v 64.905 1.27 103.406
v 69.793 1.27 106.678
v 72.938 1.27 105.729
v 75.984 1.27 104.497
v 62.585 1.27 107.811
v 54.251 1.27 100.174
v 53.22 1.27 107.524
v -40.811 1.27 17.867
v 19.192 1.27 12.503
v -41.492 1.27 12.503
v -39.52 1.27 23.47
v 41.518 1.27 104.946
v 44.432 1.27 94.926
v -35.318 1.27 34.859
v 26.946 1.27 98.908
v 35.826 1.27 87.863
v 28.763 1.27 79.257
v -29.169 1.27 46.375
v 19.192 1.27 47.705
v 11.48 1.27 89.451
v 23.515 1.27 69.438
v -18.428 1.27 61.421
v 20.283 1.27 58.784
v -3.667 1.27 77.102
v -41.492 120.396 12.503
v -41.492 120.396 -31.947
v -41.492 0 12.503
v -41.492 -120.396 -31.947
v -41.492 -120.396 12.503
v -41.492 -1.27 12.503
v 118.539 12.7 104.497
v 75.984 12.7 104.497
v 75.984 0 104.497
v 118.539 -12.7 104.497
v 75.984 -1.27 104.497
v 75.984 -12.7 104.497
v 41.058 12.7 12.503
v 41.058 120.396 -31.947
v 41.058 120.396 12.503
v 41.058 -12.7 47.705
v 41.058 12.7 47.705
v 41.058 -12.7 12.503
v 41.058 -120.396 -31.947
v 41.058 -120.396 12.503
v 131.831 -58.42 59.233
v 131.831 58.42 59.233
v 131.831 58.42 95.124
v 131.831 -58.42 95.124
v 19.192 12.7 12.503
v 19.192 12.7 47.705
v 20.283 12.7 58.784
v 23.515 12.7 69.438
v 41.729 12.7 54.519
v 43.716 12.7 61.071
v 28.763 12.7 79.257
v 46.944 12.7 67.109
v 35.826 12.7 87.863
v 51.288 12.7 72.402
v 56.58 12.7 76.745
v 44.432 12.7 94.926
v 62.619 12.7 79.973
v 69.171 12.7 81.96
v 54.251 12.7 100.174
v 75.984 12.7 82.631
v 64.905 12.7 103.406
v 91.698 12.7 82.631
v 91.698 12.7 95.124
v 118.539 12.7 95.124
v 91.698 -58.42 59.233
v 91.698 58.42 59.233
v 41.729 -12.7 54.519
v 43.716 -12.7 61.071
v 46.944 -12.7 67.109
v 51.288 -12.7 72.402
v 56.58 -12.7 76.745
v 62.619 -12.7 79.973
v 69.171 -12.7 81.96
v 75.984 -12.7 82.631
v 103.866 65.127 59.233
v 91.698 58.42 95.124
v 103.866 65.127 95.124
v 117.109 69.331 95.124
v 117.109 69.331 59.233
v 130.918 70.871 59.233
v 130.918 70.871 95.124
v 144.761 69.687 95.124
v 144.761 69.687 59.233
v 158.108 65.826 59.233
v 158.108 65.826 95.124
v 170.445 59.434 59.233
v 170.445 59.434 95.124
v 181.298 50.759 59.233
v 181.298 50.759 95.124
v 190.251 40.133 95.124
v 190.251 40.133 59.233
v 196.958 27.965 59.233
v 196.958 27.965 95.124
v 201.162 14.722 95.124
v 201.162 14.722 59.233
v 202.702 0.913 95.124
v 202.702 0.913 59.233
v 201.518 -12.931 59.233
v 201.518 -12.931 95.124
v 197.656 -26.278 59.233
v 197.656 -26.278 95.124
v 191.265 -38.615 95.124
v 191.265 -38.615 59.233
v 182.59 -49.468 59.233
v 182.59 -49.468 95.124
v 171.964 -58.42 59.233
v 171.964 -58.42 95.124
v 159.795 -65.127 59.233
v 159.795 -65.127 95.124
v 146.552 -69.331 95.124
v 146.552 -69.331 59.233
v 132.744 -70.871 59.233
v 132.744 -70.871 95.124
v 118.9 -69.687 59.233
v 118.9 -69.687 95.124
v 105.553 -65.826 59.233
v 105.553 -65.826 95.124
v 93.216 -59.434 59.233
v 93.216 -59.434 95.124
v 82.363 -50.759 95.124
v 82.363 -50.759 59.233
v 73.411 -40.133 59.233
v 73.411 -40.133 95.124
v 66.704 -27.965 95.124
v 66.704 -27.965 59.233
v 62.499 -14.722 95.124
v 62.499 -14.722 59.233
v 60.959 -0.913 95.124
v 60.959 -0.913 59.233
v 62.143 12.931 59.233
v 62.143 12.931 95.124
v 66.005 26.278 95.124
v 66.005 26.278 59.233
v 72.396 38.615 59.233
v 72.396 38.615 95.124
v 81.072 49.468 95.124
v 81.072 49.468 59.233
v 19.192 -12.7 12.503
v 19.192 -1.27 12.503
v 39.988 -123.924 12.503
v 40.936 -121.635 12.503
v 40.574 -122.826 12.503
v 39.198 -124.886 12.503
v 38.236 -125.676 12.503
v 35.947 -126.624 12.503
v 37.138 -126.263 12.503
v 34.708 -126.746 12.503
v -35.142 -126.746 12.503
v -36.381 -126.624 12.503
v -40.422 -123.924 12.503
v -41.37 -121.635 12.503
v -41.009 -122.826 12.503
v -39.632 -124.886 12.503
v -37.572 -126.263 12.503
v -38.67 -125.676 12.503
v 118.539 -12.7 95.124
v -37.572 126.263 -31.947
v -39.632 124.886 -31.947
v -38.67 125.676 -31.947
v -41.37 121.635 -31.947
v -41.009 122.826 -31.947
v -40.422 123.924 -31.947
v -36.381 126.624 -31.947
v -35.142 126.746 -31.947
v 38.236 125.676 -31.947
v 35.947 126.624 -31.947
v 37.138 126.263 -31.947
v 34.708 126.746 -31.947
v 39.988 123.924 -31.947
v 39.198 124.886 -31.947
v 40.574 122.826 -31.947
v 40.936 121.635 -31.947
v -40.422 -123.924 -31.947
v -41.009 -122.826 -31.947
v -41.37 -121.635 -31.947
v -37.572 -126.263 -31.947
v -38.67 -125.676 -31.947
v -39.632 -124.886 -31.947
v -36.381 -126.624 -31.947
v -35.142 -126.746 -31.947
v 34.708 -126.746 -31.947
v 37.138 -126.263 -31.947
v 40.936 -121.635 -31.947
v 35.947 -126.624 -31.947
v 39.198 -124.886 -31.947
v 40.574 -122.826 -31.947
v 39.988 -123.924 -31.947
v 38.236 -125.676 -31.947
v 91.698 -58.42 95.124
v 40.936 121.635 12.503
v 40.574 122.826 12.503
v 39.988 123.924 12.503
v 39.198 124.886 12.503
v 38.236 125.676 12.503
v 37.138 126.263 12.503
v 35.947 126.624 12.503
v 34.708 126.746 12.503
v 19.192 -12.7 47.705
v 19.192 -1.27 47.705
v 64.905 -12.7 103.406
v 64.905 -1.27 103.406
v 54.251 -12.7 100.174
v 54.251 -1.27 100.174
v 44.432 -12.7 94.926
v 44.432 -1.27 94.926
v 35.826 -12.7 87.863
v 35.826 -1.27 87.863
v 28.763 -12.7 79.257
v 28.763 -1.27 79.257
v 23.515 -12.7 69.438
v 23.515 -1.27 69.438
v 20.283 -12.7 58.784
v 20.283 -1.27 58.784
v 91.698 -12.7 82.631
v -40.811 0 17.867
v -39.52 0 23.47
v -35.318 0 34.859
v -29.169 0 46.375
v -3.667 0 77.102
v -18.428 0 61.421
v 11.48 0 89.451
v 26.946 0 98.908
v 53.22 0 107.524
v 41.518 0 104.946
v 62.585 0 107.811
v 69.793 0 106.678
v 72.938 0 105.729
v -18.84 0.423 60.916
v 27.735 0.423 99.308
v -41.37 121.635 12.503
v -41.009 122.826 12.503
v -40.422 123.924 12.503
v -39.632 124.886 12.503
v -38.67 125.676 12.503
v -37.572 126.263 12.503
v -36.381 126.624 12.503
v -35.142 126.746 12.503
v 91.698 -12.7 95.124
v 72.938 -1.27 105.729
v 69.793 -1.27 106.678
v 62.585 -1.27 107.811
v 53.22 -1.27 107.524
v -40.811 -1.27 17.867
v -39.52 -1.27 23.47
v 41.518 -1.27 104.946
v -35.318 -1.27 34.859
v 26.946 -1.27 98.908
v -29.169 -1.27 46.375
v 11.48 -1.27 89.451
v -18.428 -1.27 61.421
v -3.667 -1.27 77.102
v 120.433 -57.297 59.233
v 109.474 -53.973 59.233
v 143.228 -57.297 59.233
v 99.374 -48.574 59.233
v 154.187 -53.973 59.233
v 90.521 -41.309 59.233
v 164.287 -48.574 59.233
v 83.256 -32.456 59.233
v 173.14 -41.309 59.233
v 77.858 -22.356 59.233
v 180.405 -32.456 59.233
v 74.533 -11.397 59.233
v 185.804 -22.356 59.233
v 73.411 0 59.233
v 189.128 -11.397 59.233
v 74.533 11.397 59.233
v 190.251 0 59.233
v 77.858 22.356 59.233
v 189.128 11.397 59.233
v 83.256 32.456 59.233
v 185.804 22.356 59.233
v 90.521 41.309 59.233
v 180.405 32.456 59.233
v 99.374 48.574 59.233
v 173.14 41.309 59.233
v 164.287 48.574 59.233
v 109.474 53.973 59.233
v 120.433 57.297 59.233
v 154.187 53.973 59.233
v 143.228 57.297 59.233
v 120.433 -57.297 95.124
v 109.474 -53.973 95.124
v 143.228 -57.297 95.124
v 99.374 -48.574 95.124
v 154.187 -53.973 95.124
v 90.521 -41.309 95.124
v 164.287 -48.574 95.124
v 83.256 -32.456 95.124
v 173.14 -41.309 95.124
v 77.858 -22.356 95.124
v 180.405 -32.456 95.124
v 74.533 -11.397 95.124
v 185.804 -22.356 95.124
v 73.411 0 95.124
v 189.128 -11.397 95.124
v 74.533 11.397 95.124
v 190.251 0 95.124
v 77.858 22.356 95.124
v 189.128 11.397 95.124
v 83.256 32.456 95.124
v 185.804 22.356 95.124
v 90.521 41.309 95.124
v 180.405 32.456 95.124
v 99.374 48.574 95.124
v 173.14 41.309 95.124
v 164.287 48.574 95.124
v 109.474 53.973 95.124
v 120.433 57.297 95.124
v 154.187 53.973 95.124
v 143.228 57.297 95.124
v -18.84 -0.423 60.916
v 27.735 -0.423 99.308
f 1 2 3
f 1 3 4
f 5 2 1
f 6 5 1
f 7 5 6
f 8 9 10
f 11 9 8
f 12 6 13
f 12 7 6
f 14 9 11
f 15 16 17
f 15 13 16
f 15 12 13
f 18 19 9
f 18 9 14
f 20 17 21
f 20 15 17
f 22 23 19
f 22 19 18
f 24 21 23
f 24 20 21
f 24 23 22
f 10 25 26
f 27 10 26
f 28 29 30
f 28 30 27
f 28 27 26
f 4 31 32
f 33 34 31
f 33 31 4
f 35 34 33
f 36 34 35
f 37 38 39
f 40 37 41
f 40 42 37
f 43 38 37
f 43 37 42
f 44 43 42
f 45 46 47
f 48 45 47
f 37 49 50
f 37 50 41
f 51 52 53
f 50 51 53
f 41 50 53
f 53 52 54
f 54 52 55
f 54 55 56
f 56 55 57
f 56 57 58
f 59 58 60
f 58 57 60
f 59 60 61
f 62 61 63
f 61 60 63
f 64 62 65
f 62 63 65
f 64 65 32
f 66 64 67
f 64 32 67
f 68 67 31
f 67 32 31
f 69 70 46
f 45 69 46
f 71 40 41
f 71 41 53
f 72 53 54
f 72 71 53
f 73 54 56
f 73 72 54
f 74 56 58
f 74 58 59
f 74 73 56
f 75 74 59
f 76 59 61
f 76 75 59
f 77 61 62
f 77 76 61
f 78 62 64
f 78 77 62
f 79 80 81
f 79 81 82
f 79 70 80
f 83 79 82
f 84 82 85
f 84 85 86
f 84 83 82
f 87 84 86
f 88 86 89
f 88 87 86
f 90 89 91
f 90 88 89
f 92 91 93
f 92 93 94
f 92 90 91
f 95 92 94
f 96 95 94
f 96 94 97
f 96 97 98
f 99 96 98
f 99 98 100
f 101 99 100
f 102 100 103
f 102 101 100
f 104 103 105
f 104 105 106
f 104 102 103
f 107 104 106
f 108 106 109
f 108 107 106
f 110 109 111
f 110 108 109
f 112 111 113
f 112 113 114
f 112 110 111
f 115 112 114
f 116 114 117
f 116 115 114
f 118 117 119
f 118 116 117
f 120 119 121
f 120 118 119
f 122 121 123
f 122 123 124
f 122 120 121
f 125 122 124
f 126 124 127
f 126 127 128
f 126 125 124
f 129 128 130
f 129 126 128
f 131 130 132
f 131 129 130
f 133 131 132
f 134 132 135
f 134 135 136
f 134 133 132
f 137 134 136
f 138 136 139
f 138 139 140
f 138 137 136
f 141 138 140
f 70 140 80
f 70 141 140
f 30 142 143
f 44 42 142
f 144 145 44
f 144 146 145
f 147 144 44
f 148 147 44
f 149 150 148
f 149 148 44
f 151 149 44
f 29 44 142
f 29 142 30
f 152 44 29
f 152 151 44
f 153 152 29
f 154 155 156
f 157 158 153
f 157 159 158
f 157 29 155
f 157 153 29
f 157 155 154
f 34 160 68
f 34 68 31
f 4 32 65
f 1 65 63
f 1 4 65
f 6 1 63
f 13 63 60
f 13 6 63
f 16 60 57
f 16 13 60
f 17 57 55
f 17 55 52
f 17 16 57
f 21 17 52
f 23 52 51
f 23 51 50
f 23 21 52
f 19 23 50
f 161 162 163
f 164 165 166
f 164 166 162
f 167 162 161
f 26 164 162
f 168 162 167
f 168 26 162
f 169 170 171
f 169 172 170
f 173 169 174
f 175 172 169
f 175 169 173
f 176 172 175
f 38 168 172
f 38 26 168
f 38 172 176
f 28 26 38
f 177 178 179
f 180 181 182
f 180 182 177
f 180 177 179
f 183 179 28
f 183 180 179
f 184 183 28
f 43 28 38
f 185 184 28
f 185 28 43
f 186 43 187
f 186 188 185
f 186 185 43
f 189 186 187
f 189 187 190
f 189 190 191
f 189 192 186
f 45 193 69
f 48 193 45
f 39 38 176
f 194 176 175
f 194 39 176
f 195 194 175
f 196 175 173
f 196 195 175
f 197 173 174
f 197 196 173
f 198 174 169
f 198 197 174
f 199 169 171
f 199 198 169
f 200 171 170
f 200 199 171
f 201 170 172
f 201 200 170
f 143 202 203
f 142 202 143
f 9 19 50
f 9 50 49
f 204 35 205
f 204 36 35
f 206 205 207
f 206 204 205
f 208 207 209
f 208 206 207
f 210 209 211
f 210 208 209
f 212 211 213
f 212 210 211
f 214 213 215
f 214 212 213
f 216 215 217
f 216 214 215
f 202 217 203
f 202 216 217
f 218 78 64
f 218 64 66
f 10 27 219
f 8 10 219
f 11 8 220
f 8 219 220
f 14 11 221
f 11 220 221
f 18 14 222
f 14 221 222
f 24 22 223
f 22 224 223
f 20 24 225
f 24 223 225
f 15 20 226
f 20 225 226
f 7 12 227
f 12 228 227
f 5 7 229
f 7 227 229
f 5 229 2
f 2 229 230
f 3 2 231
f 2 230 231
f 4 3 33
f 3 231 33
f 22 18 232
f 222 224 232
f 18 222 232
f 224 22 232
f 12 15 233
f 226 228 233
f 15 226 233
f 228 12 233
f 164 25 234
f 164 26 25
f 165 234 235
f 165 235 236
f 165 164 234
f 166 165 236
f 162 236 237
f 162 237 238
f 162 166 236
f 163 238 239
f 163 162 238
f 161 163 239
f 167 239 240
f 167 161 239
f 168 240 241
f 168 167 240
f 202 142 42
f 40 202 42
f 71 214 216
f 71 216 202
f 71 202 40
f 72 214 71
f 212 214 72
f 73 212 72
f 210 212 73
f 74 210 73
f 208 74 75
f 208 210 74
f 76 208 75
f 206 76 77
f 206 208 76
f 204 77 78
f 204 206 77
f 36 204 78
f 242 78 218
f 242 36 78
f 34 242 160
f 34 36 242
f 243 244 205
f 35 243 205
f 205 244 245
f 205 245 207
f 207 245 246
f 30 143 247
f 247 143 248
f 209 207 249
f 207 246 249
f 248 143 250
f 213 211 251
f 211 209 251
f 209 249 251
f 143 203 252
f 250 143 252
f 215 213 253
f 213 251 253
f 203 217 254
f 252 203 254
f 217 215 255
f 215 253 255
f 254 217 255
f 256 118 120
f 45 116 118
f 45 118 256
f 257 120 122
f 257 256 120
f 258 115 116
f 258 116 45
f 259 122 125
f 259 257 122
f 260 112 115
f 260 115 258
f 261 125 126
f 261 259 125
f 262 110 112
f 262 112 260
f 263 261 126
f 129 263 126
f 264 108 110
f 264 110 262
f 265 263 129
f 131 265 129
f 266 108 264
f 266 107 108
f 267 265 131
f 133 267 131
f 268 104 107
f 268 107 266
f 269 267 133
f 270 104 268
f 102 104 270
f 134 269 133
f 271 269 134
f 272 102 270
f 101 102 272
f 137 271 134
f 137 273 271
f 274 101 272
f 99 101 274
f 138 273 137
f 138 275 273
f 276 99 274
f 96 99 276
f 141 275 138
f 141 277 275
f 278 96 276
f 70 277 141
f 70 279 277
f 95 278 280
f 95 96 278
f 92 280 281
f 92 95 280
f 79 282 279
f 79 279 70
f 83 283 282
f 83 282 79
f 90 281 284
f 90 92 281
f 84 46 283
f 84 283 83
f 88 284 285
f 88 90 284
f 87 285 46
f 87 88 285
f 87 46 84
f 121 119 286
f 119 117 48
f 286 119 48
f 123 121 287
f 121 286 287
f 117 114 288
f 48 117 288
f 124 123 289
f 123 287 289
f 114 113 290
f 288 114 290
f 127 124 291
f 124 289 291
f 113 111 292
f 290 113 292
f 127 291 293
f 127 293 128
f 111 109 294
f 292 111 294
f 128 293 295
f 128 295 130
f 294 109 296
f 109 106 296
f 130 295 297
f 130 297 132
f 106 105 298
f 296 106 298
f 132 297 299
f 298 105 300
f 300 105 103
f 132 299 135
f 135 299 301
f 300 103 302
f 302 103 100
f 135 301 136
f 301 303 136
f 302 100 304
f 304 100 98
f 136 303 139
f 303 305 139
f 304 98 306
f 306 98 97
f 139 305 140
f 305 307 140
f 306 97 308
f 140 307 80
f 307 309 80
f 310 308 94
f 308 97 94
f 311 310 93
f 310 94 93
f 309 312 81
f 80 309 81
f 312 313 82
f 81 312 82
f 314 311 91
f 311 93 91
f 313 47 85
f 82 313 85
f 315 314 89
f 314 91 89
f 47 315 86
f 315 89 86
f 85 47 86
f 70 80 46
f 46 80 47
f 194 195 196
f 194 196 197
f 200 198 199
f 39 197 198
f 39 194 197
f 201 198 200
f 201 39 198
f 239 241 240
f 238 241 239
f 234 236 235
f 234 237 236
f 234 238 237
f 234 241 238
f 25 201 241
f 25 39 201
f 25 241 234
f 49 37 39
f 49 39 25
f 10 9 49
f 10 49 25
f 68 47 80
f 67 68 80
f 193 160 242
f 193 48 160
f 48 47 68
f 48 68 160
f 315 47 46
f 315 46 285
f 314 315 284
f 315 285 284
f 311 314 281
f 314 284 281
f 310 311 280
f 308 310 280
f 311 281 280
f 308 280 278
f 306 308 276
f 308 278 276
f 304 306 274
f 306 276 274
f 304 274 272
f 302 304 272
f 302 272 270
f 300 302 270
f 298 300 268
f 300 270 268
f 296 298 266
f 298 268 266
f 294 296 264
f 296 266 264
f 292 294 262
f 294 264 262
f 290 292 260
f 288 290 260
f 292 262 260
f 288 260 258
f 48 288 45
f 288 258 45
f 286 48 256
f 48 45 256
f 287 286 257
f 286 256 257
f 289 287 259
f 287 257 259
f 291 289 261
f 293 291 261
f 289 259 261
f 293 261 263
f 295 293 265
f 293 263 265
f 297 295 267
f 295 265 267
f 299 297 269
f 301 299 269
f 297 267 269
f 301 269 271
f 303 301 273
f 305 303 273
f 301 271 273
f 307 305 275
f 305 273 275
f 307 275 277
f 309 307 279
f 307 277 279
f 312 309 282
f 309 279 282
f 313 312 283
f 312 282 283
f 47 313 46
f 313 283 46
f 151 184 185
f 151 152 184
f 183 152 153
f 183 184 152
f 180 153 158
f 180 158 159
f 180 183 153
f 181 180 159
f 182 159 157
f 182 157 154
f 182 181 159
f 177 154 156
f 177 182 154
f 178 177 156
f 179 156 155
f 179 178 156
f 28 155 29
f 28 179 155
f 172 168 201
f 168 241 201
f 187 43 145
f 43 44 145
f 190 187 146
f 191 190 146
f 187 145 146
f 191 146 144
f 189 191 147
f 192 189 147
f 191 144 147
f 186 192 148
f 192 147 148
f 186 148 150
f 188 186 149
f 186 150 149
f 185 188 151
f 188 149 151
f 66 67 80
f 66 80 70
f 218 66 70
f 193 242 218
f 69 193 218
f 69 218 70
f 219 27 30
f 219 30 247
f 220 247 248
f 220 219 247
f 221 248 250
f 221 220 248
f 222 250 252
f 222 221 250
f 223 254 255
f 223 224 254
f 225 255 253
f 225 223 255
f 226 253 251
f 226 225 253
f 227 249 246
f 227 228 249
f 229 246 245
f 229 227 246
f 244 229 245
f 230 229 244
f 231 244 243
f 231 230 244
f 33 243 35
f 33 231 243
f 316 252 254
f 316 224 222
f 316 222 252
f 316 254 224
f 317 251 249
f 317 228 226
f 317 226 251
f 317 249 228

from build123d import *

# Parameters (mm, degrees)
F1_DEPTH  = 126.746
F2_DEPTH  = 12.7
F0_W      = 26.8419216312
F0_H      = 12.4931237255
F3_DEPTH  = 58.42
F4_DEPTH  = 1.27
F3_FACE_W = 40.1330013099
F3_FACE_H = 35.8913054598
F6_R      = 6.35


with BuildPart() as f1:
    # F0 (on Front) → F1 (new body, symmetric)
    with BuildSketch(Plane.XZ):
        Polygon((19.1918514336, 12.5030142994), (-41.4921872737, 12.5030142994), (-41.4921872737, -31.9469857006), (41.0578127263, -31.9469857006), (41.0578127263, 12.5030142994), align=None)
    extrude(amount=F1_DEPTH, both=True)

    # F0 (on Front) → F2 (join, symmetric)
    with BuildSketch(Plane.XZ):
        with BuildLine():
            Line((19.1918514336, 18.5228512547), (19.1918514336, 12.5030142994))
            Line((19.1918514336, 12.5030142994), (41.0578127263, 12.5030142994))
            Line((41.0578127263, 12.5030142994), (41.0578127263, 47.7047476894))
            ThreePointArc((41.0578127263, 47.7047476894), (51.28756735, 72.4015600418), (75.9843797023, 82.6313146655))
            Line((75.9843797023, 82.6313146655), (91.6975517354, 82.6313146655))
            Line((91.6975517354, 82.6313146655), (91.6975517354, 95.124438391))
            Line((91.6975517354, 95.124438391), (118.5394733665, 95.124438391))
            Line((118.5394733665, 95.124438391), (118.5394733665, 104.4972759581))
            Line((118.5394733665, 104.4972759581), (75.9843797023, 104.4972759581))
            ThreePointArc((75.9843797023, 104.4972759581), (35.8259978428, 87.8631295489), (19.1918514336, 47.7047476894))
            Line((19.1918514336, 47.7047476894), (19.1918514336, 18.5228512547))
        make_face()
    extrude(amount=F2_DEPTH, both=True)

    # F0 (on Front) → F3 (join, symmetric)
    with BuildSketch(Plane.XZ):
        Polygon((131.8305530452, 95.124438391), (118.5394733665, 95.124438391), (118.5394733665, 82.6313146655), (91.6975517354, 82.6313146655), (91.6975517354, 59.2331329312), (131.8305530452, 59.2331329312), align=None)
        with Locations((105.118512551, 88.8778765282)):
            Rectangle(F0_W, F0_H)
    extrude(amount=F3_DEPTH, both=True)

    # F0 (on Front) → F4 (join, symmetric)
    with BuildSketch(Plane.XZ):
        with BuildLine():
            add(Edge.make_bspline(
                [(-41.4921872737, 12.5030142994), (-38.218754222, 58.1977139189), (34.3149812373, 123.6376541114), (75.9843797023, 104.4972759581)],
                knots=[0, 0, 0, 0, 149.2102140157, 149.2102140157, 149.2102140157, 149.2102140157], degree=3))
            Line((-41.4921872737, 12.5030142994), (19.1918514336, 12.5030142994))
            Line((19.1918514336, 12.5030142994), (19.1918514336, 18.5228512547))
            Line((19.1918514336, 18.5228512547), (19.1918514336, 47.7047476894))
            ThreePointArc((19.1918514336, 47.7047476894), (35.8259978428, 87.8631295489), (75.9843797023, 104.4972759581))
        make_face()
    extrude(amount=F4_DEPTH, both=True)

    # F6
    f6_edges = [f1.edges().sort_by_distance(p)[0] for p in [
        (41.057813, 126.746, -9.721986),
        (41.057813, -126.746, -9.721986),
        (-41.492187, -126.746, -9.721986),
        (-41.492187, 126.746, -9.721986),
    ]]
    fillet(f6_edges, radius=F6_R)


with BuildPart() as f5:
    # F3_face (on face) → F5 (revolve)
    with BuildSketch(Plane(origin=(111.7640523903, 58.42, 77.1787856611), x_dir=(1, 0, 0), z_dir=(0, 1, 0))):
        Rectangle(F3_FACE_W, F3_FACE_H)
    revolve(axis=Axis((131.8305530452, 0, 77.1787856611), (0, 0, -1)))


solid = Compound([f1.part, f5.part])
